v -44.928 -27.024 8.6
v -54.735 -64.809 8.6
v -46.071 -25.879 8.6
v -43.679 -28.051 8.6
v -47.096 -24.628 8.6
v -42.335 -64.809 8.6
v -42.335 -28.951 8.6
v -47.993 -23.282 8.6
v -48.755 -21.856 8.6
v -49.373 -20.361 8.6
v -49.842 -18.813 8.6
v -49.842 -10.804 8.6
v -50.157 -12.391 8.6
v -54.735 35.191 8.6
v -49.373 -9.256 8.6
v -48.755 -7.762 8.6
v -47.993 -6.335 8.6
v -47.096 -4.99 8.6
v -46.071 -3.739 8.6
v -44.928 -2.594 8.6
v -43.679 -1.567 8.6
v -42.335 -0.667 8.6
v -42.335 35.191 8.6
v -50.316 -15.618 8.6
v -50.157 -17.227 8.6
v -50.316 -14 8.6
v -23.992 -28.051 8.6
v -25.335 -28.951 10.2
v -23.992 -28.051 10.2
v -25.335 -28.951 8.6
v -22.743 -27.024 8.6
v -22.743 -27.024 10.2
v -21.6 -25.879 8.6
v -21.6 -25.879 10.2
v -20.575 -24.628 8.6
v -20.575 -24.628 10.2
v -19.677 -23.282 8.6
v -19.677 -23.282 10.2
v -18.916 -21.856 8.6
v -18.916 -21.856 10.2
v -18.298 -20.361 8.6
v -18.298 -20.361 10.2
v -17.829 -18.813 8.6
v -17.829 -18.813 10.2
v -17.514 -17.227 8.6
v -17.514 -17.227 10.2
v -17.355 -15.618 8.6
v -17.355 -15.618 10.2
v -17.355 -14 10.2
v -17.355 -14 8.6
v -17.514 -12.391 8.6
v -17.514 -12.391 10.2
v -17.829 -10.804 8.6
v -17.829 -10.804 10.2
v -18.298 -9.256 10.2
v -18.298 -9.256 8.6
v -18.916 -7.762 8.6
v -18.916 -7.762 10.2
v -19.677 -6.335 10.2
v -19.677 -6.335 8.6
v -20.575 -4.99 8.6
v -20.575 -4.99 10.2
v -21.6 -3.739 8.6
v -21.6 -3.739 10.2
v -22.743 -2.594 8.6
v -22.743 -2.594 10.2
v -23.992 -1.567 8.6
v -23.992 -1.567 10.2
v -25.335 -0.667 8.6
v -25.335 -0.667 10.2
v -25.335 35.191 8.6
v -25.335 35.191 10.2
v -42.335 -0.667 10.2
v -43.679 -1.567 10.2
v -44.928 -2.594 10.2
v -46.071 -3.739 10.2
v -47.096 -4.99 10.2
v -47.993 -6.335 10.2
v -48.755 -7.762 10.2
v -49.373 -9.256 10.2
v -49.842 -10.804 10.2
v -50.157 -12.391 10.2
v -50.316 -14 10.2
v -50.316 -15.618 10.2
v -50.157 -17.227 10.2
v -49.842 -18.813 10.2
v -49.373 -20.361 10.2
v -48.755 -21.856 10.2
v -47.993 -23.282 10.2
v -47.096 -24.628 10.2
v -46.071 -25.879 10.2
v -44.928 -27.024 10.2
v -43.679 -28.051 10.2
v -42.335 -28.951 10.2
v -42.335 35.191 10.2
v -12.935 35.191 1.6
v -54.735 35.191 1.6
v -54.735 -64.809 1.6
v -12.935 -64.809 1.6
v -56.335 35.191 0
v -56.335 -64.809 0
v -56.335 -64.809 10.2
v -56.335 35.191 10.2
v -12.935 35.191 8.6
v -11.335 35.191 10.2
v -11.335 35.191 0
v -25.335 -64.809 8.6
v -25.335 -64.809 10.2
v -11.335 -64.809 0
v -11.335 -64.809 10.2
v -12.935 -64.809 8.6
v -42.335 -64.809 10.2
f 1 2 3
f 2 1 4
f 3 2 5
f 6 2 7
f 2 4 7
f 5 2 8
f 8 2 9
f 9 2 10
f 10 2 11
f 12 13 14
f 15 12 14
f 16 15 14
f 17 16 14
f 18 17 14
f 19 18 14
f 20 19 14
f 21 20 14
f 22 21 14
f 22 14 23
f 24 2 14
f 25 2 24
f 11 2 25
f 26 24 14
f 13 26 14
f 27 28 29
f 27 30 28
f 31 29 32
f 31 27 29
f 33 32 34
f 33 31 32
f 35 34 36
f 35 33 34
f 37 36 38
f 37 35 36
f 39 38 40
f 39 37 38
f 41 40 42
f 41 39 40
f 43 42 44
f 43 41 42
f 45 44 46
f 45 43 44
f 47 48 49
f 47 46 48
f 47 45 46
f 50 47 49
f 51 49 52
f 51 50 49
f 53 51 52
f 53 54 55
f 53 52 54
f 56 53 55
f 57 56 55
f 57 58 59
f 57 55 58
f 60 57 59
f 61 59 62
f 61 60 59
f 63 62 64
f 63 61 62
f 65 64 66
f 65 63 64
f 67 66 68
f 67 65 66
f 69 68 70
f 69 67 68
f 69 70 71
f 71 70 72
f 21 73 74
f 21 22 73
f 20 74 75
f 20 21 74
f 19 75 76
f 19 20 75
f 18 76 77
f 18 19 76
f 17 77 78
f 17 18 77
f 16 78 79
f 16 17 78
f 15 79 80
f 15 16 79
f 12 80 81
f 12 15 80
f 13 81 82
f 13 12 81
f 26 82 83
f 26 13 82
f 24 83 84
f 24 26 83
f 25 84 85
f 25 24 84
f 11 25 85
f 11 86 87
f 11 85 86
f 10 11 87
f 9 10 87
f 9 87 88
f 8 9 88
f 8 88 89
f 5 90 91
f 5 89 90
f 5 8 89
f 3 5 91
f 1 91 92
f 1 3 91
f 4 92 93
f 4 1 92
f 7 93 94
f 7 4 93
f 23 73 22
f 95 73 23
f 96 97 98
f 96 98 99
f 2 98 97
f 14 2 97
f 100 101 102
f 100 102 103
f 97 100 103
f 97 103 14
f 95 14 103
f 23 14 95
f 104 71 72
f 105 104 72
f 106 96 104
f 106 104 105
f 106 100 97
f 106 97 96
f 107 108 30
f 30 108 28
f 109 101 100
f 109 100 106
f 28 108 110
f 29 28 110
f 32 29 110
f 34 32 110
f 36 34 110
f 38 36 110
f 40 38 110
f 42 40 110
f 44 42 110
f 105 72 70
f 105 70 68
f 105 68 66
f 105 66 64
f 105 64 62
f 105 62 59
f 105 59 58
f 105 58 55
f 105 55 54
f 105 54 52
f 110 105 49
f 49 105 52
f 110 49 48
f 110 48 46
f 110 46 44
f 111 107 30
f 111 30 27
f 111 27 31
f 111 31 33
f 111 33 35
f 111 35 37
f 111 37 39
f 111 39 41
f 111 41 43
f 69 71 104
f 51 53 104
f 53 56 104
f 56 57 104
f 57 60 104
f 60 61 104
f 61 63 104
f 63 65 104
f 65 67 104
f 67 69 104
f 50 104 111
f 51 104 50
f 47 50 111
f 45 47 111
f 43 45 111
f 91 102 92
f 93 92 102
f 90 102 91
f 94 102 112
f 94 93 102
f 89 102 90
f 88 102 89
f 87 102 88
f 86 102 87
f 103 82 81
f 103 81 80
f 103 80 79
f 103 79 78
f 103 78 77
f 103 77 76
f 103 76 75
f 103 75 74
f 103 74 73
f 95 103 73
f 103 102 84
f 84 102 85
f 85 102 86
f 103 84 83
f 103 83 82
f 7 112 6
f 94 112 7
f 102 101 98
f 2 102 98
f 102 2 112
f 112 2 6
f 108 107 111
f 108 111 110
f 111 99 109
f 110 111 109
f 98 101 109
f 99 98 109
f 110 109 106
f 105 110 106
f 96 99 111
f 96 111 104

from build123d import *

# Parameters (mm, degrees)
F0_W     = 45
F0_H     = 100
F1_DEPTH = 10.2
F2_W     = 17
F2_H     = 100
F3_DEPTH = 8.6
F4_W     = 41.8
F4_H     = 100
F5_DEPTH = 7
F8_R     = 16.5
F9_DEPTH = 10


with BuildPart() as f1:
    # F0 (on Top) → F1 (new body)
    with BuildSketch(Plane.XY):
        with Locations((-33.835356, -14.808846)):
            Rectangle(F0_W, F0_H)
    extrude(amount=F1_DEPTH)

    # F2 (on face) → F3 (cut)
    with BuildSketch(Plane.XY.offset(10.2)):
        with Locations((-33.835356, -14.808846)):
            Rectangle(F2_W, F2_H)
    extrude(amount=-F3_DEPTH, mode=Mode.SUBTRACT)


with BuildPart() as f5:
    # F4 (on Top) → F5 (new body)
    with BuildSketch(Plane.XY):
        with Locations((-35.435356, -14.808846)):
            Rectangle(F4_W, F4_H)
    extrude(amount=F5_DEPTH)


with BuildPart() as f5_1:
    # F6: moved
    add(f5.part.moved(Location((1.6, 0, 1.6))))


with BuildPart() as f1_1:
    add(f1.part)

    # F7: cut F5
    add(f5_1.part, mode=Mode.SUBTRACT)


with BuildPart() as f9:
    # F8 (on Top) → F9 (new body)
    with BuildSketch(Plane.XY):
        with Locations((-33.835356, -64.808846)):
            Circle(F8_R)
    extrude(amount=F9_DEPTH)


with BuildPart() as f9_1:
    # F10: moved
    add(f9.part.moved(Location((0, 50, 4))))


with BuildPart() as f1_2:
    add(f1_1.part)

    # F11: cut F9
    add(f9_1.part, mode=Mode.SUBTRACT)


solid = f1_2.part
